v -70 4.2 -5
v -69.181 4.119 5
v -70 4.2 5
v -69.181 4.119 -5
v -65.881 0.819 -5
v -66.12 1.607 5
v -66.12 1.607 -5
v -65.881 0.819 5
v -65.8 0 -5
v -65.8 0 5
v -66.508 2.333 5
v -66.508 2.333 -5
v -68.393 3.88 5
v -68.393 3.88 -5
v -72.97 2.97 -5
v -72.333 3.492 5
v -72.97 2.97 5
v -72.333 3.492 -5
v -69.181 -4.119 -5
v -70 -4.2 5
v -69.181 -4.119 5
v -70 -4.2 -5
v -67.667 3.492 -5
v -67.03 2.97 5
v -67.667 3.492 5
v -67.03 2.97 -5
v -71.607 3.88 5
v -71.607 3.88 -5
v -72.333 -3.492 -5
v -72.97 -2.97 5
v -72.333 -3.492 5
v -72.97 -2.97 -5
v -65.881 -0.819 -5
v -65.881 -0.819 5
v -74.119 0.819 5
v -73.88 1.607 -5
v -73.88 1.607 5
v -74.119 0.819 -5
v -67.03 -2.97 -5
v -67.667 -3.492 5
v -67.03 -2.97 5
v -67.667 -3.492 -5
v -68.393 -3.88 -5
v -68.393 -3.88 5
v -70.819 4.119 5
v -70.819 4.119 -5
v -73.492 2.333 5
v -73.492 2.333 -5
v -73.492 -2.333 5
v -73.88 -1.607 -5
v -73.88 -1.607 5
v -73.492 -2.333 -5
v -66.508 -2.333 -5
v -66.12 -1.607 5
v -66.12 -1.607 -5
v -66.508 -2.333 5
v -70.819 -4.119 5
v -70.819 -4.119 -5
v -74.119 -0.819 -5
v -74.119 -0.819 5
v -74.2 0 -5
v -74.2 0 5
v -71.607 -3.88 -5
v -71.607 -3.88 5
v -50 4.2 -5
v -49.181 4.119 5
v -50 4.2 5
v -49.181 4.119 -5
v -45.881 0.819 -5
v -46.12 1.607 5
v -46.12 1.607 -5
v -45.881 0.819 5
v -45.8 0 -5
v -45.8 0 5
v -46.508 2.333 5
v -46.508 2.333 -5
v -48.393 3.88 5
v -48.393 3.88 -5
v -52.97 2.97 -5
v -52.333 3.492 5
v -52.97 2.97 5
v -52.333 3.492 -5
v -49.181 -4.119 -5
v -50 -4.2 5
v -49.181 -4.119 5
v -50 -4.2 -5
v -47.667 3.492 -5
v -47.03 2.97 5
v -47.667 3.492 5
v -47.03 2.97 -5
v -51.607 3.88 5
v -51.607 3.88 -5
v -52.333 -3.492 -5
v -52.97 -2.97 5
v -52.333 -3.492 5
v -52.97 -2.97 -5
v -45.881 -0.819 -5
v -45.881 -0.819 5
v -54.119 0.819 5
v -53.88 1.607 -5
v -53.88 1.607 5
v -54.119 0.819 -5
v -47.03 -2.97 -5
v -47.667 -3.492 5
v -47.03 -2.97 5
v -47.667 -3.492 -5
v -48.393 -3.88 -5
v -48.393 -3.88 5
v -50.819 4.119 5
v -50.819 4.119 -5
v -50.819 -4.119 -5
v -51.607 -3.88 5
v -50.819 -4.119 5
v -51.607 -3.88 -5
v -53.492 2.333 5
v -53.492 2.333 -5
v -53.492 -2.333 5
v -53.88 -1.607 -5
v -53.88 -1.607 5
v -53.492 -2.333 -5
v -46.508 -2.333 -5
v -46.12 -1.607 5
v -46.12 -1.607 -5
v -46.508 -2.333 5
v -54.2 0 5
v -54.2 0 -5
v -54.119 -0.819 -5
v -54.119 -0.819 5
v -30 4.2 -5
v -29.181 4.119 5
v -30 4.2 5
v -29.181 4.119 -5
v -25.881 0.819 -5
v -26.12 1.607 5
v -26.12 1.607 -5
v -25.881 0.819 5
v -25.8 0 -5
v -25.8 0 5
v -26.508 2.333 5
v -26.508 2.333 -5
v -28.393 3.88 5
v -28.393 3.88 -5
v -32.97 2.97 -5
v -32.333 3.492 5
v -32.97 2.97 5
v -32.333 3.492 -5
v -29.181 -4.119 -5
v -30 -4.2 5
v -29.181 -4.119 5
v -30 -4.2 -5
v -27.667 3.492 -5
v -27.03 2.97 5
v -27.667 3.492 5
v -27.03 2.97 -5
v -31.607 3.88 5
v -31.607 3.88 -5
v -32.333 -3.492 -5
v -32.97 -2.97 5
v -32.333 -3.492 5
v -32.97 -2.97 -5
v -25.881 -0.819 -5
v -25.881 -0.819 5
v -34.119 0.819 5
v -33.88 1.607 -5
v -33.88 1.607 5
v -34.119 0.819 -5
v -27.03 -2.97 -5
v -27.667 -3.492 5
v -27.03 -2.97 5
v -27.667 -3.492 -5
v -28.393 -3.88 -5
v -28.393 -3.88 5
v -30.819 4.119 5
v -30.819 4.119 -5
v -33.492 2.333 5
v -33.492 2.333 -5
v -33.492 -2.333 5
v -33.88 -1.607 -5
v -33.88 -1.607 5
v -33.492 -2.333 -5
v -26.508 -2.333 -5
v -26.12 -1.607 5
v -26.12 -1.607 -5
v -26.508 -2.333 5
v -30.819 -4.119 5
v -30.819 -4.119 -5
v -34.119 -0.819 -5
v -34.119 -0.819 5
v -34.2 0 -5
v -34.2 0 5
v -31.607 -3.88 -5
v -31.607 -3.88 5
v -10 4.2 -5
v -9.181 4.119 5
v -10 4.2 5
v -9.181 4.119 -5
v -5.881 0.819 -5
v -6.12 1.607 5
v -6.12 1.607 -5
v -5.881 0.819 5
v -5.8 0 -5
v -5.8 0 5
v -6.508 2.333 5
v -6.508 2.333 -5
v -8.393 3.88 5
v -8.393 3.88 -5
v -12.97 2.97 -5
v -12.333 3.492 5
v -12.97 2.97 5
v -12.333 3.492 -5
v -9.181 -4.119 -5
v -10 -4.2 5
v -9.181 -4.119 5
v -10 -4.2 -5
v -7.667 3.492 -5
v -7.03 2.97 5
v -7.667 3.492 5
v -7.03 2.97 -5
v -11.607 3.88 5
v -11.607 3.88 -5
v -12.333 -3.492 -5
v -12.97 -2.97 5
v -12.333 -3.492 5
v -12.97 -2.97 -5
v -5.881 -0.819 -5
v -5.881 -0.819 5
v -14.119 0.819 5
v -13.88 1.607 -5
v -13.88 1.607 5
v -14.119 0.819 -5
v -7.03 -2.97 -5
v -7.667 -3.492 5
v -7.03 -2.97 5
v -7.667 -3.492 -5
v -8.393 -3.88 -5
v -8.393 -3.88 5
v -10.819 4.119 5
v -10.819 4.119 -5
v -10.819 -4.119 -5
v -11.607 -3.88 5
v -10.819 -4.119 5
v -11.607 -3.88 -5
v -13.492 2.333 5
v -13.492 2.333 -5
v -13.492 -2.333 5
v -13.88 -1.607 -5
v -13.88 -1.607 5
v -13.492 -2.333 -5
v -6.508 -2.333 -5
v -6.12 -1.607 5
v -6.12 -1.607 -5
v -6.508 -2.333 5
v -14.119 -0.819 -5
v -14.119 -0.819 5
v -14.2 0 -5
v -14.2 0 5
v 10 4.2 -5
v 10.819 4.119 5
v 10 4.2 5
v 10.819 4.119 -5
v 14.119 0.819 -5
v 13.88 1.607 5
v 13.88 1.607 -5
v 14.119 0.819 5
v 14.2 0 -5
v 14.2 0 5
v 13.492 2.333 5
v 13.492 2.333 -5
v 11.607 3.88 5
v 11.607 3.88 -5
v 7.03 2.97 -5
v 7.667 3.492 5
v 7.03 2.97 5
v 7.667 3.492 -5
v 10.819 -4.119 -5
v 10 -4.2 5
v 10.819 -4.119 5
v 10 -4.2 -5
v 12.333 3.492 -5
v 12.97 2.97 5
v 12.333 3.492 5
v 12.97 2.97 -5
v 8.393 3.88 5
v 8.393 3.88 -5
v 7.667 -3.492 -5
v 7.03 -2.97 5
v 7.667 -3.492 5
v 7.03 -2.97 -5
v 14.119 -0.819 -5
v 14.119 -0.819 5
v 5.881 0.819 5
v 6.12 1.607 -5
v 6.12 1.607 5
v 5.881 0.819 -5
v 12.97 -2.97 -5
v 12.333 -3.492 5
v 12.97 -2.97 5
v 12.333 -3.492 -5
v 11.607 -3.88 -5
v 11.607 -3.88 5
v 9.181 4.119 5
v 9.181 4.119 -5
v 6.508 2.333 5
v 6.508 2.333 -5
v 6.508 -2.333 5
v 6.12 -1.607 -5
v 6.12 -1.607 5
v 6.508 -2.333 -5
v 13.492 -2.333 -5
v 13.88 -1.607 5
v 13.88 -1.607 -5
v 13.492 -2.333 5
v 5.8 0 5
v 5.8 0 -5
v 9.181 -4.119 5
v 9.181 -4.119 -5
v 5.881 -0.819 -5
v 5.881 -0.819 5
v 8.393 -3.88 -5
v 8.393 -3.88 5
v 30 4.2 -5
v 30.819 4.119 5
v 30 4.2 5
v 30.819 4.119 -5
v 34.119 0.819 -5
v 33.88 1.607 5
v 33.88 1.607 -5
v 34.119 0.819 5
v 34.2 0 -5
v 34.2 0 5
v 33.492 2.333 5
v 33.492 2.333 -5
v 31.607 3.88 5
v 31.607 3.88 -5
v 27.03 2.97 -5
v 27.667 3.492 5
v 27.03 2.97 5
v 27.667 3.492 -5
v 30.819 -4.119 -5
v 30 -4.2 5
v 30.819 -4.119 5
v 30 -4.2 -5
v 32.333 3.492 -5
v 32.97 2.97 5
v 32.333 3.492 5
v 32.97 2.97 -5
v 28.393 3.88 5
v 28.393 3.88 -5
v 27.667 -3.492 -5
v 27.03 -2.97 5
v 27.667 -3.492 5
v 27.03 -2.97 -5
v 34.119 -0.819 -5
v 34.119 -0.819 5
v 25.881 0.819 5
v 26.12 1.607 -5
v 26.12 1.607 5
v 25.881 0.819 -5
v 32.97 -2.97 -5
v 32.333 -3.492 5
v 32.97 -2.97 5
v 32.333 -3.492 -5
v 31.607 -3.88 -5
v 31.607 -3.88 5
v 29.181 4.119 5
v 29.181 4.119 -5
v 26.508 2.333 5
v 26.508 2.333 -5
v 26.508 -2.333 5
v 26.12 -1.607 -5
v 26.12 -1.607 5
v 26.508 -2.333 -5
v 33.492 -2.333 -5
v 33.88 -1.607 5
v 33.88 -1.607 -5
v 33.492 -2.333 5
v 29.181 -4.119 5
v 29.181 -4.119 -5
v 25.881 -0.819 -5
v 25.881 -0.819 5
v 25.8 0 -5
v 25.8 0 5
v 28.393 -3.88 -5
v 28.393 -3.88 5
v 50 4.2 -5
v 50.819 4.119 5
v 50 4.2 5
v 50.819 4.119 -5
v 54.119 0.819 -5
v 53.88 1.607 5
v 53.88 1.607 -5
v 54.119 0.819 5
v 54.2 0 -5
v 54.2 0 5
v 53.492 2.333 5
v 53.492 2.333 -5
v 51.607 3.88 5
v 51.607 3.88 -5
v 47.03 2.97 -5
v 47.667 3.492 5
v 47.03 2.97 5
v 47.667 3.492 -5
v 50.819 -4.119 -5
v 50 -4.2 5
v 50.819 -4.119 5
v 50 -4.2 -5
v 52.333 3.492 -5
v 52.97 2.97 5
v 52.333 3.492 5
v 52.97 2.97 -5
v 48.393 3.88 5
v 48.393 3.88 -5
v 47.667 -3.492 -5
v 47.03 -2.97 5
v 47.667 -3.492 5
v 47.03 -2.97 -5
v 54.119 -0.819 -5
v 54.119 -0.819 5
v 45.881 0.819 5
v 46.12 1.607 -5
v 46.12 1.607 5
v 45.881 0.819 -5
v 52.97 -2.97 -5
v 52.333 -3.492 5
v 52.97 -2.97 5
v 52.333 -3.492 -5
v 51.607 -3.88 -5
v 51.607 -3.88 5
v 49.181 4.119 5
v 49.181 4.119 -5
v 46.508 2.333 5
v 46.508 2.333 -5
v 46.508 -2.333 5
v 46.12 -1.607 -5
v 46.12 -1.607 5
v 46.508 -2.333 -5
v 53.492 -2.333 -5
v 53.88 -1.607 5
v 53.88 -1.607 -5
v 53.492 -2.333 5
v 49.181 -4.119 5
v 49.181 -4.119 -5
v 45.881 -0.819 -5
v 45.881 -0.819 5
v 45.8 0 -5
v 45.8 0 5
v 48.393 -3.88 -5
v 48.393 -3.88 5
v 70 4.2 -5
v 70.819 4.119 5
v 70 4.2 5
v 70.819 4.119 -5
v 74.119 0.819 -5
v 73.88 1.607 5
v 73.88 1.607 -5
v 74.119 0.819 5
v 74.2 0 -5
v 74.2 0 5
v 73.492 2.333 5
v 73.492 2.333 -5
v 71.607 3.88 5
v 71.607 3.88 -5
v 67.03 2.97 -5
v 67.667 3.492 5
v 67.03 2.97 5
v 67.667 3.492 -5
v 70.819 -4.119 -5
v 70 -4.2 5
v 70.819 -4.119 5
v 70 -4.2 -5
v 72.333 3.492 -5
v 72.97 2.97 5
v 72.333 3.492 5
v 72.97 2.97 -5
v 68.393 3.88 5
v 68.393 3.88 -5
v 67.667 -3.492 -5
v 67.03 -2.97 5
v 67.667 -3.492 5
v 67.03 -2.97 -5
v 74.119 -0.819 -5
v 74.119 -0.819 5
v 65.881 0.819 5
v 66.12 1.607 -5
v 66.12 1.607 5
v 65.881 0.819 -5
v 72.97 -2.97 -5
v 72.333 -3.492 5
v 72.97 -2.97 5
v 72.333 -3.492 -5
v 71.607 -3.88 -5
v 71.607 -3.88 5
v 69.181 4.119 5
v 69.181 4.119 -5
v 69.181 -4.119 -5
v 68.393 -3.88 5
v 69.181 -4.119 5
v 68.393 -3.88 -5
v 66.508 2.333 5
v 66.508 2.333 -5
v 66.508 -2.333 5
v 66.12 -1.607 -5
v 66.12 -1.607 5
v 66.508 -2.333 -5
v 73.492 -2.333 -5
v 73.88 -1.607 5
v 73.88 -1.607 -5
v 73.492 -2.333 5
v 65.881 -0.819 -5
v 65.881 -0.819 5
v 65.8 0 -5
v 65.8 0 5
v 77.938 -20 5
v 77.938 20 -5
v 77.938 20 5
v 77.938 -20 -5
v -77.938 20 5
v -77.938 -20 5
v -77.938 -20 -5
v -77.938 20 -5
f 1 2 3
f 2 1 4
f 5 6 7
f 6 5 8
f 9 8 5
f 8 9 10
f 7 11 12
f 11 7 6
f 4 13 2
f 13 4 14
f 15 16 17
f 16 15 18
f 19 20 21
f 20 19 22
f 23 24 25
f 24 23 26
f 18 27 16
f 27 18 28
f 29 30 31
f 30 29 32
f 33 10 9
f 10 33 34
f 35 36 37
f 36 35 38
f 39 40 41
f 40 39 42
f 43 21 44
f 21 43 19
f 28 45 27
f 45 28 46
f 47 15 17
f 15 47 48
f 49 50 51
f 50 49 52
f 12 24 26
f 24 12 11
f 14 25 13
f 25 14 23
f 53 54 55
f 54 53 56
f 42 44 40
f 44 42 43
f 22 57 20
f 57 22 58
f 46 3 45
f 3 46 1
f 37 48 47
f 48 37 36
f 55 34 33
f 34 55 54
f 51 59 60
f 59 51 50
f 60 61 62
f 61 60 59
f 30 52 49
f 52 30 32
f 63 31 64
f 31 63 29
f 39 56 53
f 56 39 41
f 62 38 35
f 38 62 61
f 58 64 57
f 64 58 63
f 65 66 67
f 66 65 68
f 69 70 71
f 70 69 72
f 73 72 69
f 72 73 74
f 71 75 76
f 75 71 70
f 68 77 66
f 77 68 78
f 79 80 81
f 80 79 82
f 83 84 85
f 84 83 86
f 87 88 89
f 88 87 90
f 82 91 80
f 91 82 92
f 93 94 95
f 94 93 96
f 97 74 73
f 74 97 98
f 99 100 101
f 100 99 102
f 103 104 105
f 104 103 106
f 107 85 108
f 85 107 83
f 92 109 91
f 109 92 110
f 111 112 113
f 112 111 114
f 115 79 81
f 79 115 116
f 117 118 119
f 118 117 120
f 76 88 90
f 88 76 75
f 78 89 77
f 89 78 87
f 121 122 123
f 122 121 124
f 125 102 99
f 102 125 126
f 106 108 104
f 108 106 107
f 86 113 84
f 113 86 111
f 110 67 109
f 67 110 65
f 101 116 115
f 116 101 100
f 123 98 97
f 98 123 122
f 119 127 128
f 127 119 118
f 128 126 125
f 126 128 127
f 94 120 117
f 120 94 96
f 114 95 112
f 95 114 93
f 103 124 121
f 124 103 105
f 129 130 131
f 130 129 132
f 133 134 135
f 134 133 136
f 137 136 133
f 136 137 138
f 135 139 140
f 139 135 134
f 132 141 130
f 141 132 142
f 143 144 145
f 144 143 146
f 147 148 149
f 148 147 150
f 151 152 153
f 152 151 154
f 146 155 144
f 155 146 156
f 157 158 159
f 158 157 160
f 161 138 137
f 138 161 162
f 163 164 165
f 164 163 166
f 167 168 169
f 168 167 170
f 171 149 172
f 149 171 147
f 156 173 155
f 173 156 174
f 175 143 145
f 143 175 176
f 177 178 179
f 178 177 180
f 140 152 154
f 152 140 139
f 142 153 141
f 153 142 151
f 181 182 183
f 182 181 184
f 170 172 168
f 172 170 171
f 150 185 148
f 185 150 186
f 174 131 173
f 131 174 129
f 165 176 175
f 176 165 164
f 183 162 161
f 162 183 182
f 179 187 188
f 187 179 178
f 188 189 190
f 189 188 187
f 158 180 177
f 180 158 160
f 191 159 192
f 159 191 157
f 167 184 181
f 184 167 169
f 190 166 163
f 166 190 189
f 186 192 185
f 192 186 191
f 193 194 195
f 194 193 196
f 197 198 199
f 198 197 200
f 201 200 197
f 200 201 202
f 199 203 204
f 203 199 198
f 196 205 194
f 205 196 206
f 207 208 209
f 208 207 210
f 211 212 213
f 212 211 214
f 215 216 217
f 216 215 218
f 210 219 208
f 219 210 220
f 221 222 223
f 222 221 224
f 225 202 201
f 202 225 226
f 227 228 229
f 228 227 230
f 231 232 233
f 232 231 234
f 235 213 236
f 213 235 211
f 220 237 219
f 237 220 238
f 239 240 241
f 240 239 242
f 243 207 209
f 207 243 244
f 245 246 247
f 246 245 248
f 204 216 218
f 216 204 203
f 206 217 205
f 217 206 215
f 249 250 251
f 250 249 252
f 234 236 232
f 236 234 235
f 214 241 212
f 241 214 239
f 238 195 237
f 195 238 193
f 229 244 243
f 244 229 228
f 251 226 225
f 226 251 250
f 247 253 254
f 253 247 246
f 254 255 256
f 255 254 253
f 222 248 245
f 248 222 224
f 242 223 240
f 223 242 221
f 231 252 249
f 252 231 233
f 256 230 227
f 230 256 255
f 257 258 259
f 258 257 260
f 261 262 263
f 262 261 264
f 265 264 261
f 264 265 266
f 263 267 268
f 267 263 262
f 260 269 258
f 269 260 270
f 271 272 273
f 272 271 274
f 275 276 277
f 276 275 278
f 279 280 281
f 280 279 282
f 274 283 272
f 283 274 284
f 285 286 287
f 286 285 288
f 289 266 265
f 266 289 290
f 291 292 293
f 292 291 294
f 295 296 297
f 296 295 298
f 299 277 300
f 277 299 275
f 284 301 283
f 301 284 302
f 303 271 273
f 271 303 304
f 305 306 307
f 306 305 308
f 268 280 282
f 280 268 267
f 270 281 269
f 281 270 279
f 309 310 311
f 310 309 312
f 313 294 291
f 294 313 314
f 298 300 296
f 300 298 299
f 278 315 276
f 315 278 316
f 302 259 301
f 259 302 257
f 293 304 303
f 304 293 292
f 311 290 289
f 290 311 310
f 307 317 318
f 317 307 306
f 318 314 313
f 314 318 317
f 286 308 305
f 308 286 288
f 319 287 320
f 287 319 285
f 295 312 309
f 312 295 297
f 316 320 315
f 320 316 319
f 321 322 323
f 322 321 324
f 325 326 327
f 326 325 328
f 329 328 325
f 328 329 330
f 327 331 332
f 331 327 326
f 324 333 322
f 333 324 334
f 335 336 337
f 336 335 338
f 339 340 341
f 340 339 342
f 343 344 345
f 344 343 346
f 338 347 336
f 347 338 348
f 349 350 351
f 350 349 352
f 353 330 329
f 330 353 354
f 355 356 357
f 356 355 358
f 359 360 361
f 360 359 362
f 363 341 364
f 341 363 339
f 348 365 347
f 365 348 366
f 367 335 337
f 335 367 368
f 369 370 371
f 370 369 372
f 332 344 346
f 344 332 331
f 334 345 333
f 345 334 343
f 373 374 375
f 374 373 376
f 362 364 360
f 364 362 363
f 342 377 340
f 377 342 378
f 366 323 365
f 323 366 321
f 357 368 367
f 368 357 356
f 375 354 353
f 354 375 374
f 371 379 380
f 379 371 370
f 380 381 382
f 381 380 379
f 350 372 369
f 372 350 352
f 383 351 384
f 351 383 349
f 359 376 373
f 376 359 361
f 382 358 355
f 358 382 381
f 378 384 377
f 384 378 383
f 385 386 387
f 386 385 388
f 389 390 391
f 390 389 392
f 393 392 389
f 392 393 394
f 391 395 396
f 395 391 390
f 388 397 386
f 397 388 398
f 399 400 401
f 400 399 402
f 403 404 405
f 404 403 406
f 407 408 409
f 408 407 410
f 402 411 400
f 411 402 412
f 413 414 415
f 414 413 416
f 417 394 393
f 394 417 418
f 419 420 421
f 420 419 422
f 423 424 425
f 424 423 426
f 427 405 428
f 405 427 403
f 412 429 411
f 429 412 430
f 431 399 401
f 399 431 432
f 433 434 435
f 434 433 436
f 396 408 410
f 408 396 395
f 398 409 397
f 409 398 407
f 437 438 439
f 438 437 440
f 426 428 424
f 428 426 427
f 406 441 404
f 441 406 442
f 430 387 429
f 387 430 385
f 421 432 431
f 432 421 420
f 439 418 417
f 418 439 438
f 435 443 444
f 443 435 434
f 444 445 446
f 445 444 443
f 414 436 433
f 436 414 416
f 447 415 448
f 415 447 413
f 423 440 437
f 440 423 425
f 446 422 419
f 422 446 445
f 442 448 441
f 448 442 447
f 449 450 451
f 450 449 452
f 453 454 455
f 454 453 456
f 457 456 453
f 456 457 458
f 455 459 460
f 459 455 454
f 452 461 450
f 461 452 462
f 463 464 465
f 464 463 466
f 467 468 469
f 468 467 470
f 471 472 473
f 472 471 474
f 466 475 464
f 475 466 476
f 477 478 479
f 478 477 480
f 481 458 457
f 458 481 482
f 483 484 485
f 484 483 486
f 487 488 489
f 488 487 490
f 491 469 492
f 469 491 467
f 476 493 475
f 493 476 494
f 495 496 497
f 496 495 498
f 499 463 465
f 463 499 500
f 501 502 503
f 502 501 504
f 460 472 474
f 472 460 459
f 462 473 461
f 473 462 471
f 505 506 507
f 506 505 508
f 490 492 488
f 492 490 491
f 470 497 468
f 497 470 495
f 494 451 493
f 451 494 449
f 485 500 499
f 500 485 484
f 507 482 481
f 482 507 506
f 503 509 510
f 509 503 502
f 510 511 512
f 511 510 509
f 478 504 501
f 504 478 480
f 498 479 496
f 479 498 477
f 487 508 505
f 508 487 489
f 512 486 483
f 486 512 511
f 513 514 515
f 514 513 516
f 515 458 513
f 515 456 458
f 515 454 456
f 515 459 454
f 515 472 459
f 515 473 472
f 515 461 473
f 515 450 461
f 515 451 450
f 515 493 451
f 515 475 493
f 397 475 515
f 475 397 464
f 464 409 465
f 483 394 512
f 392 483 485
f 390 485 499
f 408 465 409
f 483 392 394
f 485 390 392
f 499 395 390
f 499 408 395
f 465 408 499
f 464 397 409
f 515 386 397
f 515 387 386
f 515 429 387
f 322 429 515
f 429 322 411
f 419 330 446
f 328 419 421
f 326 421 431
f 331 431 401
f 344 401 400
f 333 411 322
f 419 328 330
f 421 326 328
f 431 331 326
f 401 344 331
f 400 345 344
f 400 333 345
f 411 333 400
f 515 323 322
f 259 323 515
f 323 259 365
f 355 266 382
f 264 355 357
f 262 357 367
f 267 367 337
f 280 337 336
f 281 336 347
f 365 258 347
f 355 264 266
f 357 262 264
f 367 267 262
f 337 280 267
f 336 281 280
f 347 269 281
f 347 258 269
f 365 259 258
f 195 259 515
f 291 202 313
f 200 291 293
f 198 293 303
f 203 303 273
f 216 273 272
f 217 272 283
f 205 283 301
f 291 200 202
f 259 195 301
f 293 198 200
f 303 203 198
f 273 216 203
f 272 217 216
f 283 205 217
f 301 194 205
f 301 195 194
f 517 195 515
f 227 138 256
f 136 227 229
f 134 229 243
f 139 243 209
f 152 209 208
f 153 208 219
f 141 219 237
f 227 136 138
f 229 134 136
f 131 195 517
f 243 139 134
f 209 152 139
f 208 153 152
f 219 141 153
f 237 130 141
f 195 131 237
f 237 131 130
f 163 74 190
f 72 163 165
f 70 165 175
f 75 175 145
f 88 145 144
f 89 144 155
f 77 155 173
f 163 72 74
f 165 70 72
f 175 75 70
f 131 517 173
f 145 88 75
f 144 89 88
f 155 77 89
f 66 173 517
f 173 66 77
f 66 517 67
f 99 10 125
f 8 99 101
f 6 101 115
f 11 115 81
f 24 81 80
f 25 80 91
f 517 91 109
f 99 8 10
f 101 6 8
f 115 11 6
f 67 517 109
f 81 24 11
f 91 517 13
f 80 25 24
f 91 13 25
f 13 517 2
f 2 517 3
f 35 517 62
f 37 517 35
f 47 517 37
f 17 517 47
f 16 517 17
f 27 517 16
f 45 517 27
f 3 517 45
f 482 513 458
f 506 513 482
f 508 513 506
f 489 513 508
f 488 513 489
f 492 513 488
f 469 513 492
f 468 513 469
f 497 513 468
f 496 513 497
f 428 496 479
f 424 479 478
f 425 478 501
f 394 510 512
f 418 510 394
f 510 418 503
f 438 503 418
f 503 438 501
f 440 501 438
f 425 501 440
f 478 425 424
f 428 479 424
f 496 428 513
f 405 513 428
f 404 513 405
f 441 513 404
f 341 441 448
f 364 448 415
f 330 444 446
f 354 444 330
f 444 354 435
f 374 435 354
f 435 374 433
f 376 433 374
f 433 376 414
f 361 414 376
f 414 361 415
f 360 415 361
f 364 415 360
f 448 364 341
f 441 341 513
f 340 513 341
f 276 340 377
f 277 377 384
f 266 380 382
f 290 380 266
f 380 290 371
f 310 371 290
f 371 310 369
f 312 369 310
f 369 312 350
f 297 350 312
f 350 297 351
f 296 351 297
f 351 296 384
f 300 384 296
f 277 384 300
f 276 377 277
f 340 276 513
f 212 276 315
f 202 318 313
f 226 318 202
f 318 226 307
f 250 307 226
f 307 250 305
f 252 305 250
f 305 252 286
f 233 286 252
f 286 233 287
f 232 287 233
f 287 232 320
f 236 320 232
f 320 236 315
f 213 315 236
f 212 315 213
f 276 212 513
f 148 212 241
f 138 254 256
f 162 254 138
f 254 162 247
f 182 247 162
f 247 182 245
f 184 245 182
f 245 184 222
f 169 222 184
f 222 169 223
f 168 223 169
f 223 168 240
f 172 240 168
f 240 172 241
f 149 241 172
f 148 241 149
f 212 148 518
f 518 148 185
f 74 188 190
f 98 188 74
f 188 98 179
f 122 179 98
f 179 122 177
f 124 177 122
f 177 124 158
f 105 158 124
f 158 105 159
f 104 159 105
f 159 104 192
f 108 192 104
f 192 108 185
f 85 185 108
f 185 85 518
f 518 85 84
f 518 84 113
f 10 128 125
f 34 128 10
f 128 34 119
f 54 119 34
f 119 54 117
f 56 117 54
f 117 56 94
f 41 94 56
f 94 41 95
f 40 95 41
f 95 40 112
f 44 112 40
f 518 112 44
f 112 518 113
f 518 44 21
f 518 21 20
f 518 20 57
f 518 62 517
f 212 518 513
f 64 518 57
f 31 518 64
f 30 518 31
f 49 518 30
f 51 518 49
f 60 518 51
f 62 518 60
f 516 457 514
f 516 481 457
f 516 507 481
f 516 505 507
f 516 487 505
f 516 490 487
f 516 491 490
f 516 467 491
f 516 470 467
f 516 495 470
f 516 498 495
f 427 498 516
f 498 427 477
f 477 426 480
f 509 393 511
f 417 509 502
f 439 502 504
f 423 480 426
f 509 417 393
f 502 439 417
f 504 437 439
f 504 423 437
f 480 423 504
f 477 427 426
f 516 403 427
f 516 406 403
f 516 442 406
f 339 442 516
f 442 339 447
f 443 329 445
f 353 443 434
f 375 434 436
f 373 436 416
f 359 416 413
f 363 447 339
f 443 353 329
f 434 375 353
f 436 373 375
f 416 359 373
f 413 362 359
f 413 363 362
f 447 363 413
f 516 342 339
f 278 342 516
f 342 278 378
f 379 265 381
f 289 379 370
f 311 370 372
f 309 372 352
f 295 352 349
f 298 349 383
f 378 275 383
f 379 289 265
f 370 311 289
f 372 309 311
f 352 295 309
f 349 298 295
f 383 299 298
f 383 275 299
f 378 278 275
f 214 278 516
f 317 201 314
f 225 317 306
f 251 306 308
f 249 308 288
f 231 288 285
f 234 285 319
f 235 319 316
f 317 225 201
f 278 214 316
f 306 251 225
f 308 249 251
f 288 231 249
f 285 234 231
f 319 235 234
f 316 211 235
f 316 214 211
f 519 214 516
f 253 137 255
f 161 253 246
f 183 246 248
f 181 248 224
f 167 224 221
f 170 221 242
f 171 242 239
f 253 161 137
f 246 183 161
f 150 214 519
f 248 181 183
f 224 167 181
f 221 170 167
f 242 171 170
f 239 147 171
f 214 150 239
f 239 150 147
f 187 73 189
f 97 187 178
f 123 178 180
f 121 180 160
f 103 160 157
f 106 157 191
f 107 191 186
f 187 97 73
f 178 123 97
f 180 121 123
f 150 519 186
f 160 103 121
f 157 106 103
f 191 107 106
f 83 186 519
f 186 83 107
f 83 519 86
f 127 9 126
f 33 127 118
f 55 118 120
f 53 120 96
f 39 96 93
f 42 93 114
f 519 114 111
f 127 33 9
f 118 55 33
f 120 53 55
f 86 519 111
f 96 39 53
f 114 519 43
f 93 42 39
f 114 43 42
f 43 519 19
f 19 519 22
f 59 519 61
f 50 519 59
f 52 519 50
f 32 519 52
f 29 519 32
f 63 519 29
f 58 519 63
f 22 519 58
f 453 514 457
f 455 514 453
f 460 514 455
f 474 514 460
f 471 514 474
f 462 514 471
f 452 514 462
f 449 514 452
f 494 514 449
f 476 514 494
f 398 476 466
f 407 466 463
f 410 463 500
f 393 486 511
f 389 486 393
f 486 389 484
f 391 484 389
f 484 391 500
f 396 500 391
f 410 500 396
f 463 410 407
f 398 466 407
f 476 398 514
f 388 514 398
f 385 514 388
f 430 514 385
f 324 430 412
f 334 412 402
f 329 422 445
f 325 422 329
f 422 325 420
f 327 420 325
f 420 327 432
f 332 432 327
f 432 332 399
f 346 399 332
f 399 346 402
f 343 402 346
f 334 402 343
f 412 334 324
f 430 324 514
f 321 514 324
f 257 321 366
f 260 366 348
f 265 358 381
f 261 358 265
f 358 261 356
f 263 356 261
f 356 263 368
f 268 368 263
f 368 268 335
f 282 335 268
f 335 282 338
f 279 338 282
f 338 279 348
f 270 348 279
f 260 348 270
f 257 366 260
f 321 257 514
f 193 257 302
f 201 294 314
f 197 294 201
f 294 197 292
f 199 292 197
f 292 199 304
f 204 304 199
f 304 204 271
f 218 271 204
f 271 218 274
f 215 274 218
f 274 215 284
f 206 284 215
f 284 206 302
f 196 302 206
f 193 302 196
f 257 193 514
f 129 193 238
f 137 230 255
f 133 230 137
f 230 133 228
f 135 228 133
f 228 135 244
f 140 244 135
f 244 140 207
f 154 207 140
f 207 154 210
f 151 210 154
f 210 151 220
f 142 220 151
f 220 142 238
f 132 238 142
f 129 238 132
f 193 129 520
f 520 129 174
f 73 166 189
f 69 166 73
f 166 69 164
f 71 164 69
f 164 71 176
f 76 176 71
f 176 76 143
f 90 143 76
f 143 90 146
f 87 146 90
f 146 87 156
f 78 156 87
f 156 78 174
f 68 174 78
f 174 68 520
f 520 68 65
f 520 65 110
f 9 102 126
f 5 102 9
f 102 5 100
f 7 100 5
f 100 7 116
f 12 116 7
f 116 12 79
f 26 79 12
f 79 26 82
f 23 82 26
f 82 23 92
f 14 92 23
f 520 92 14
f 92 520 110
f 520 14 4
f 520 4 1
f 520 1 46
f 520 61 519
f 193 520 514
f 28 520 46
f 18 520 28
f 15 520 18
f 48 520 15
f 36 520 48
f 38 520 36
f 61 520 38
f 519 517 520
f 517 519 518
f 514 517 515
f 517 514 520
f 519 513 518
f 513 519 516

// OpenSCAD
$fn = 32;

// ----------------------------------------------------------------------
// Hole bar, 8 x Ø8.4
// row layout, 7.9375 mm edge offset
// ----------------------------------------------------------------------

// --- parameters (mm) ---
bar_w = 40;    // bar width (Y)
bar_t = 10;    // bar thickness (Z)
holes = 8;     // holes per row
hole_d = 8.4;  // hole diameter
edge = 7.938;  // offset from the bar end to the first hole
pitch = 20;    // pitch between neighbouring holes

// --- derived feature positions (mm) ---
span = (holes - 1) * pitch;   // = 140   distance between the end holes
bar_l = span + 2 * edge;      // = 155.88   overall bar length
start_x = -bar_l / 2 + edge;  // = -70   X of the first hole
feature_centers = [
  [start_x + 0 * pitch, 0],
  [start_x + 1 * pitch, 0],
  [start_x + 2 * pitch, 0],
  [start_x + 3 * pitch, 0],
  [start_x + 4 * pitch, 0],
  [start_x + 5 * pitch, 0],
  [start_x + 6 * pitch, 0],
  [start_x + 7 * pitch, 0]
];   // hole centres of the first row

// bar with one row of holes, drilled from feature_centers
difference() {
  translate([-bar_l / 2, -bar_w / 2, -bar_t / 2]) cube([bar_l, bar_w, bar_t]);
  for (centre = feature_centers)
    translate([centre[0], centre[1], 0])
      cylinder(d = hole_d, h = bar_t + 2, center = true);
}
